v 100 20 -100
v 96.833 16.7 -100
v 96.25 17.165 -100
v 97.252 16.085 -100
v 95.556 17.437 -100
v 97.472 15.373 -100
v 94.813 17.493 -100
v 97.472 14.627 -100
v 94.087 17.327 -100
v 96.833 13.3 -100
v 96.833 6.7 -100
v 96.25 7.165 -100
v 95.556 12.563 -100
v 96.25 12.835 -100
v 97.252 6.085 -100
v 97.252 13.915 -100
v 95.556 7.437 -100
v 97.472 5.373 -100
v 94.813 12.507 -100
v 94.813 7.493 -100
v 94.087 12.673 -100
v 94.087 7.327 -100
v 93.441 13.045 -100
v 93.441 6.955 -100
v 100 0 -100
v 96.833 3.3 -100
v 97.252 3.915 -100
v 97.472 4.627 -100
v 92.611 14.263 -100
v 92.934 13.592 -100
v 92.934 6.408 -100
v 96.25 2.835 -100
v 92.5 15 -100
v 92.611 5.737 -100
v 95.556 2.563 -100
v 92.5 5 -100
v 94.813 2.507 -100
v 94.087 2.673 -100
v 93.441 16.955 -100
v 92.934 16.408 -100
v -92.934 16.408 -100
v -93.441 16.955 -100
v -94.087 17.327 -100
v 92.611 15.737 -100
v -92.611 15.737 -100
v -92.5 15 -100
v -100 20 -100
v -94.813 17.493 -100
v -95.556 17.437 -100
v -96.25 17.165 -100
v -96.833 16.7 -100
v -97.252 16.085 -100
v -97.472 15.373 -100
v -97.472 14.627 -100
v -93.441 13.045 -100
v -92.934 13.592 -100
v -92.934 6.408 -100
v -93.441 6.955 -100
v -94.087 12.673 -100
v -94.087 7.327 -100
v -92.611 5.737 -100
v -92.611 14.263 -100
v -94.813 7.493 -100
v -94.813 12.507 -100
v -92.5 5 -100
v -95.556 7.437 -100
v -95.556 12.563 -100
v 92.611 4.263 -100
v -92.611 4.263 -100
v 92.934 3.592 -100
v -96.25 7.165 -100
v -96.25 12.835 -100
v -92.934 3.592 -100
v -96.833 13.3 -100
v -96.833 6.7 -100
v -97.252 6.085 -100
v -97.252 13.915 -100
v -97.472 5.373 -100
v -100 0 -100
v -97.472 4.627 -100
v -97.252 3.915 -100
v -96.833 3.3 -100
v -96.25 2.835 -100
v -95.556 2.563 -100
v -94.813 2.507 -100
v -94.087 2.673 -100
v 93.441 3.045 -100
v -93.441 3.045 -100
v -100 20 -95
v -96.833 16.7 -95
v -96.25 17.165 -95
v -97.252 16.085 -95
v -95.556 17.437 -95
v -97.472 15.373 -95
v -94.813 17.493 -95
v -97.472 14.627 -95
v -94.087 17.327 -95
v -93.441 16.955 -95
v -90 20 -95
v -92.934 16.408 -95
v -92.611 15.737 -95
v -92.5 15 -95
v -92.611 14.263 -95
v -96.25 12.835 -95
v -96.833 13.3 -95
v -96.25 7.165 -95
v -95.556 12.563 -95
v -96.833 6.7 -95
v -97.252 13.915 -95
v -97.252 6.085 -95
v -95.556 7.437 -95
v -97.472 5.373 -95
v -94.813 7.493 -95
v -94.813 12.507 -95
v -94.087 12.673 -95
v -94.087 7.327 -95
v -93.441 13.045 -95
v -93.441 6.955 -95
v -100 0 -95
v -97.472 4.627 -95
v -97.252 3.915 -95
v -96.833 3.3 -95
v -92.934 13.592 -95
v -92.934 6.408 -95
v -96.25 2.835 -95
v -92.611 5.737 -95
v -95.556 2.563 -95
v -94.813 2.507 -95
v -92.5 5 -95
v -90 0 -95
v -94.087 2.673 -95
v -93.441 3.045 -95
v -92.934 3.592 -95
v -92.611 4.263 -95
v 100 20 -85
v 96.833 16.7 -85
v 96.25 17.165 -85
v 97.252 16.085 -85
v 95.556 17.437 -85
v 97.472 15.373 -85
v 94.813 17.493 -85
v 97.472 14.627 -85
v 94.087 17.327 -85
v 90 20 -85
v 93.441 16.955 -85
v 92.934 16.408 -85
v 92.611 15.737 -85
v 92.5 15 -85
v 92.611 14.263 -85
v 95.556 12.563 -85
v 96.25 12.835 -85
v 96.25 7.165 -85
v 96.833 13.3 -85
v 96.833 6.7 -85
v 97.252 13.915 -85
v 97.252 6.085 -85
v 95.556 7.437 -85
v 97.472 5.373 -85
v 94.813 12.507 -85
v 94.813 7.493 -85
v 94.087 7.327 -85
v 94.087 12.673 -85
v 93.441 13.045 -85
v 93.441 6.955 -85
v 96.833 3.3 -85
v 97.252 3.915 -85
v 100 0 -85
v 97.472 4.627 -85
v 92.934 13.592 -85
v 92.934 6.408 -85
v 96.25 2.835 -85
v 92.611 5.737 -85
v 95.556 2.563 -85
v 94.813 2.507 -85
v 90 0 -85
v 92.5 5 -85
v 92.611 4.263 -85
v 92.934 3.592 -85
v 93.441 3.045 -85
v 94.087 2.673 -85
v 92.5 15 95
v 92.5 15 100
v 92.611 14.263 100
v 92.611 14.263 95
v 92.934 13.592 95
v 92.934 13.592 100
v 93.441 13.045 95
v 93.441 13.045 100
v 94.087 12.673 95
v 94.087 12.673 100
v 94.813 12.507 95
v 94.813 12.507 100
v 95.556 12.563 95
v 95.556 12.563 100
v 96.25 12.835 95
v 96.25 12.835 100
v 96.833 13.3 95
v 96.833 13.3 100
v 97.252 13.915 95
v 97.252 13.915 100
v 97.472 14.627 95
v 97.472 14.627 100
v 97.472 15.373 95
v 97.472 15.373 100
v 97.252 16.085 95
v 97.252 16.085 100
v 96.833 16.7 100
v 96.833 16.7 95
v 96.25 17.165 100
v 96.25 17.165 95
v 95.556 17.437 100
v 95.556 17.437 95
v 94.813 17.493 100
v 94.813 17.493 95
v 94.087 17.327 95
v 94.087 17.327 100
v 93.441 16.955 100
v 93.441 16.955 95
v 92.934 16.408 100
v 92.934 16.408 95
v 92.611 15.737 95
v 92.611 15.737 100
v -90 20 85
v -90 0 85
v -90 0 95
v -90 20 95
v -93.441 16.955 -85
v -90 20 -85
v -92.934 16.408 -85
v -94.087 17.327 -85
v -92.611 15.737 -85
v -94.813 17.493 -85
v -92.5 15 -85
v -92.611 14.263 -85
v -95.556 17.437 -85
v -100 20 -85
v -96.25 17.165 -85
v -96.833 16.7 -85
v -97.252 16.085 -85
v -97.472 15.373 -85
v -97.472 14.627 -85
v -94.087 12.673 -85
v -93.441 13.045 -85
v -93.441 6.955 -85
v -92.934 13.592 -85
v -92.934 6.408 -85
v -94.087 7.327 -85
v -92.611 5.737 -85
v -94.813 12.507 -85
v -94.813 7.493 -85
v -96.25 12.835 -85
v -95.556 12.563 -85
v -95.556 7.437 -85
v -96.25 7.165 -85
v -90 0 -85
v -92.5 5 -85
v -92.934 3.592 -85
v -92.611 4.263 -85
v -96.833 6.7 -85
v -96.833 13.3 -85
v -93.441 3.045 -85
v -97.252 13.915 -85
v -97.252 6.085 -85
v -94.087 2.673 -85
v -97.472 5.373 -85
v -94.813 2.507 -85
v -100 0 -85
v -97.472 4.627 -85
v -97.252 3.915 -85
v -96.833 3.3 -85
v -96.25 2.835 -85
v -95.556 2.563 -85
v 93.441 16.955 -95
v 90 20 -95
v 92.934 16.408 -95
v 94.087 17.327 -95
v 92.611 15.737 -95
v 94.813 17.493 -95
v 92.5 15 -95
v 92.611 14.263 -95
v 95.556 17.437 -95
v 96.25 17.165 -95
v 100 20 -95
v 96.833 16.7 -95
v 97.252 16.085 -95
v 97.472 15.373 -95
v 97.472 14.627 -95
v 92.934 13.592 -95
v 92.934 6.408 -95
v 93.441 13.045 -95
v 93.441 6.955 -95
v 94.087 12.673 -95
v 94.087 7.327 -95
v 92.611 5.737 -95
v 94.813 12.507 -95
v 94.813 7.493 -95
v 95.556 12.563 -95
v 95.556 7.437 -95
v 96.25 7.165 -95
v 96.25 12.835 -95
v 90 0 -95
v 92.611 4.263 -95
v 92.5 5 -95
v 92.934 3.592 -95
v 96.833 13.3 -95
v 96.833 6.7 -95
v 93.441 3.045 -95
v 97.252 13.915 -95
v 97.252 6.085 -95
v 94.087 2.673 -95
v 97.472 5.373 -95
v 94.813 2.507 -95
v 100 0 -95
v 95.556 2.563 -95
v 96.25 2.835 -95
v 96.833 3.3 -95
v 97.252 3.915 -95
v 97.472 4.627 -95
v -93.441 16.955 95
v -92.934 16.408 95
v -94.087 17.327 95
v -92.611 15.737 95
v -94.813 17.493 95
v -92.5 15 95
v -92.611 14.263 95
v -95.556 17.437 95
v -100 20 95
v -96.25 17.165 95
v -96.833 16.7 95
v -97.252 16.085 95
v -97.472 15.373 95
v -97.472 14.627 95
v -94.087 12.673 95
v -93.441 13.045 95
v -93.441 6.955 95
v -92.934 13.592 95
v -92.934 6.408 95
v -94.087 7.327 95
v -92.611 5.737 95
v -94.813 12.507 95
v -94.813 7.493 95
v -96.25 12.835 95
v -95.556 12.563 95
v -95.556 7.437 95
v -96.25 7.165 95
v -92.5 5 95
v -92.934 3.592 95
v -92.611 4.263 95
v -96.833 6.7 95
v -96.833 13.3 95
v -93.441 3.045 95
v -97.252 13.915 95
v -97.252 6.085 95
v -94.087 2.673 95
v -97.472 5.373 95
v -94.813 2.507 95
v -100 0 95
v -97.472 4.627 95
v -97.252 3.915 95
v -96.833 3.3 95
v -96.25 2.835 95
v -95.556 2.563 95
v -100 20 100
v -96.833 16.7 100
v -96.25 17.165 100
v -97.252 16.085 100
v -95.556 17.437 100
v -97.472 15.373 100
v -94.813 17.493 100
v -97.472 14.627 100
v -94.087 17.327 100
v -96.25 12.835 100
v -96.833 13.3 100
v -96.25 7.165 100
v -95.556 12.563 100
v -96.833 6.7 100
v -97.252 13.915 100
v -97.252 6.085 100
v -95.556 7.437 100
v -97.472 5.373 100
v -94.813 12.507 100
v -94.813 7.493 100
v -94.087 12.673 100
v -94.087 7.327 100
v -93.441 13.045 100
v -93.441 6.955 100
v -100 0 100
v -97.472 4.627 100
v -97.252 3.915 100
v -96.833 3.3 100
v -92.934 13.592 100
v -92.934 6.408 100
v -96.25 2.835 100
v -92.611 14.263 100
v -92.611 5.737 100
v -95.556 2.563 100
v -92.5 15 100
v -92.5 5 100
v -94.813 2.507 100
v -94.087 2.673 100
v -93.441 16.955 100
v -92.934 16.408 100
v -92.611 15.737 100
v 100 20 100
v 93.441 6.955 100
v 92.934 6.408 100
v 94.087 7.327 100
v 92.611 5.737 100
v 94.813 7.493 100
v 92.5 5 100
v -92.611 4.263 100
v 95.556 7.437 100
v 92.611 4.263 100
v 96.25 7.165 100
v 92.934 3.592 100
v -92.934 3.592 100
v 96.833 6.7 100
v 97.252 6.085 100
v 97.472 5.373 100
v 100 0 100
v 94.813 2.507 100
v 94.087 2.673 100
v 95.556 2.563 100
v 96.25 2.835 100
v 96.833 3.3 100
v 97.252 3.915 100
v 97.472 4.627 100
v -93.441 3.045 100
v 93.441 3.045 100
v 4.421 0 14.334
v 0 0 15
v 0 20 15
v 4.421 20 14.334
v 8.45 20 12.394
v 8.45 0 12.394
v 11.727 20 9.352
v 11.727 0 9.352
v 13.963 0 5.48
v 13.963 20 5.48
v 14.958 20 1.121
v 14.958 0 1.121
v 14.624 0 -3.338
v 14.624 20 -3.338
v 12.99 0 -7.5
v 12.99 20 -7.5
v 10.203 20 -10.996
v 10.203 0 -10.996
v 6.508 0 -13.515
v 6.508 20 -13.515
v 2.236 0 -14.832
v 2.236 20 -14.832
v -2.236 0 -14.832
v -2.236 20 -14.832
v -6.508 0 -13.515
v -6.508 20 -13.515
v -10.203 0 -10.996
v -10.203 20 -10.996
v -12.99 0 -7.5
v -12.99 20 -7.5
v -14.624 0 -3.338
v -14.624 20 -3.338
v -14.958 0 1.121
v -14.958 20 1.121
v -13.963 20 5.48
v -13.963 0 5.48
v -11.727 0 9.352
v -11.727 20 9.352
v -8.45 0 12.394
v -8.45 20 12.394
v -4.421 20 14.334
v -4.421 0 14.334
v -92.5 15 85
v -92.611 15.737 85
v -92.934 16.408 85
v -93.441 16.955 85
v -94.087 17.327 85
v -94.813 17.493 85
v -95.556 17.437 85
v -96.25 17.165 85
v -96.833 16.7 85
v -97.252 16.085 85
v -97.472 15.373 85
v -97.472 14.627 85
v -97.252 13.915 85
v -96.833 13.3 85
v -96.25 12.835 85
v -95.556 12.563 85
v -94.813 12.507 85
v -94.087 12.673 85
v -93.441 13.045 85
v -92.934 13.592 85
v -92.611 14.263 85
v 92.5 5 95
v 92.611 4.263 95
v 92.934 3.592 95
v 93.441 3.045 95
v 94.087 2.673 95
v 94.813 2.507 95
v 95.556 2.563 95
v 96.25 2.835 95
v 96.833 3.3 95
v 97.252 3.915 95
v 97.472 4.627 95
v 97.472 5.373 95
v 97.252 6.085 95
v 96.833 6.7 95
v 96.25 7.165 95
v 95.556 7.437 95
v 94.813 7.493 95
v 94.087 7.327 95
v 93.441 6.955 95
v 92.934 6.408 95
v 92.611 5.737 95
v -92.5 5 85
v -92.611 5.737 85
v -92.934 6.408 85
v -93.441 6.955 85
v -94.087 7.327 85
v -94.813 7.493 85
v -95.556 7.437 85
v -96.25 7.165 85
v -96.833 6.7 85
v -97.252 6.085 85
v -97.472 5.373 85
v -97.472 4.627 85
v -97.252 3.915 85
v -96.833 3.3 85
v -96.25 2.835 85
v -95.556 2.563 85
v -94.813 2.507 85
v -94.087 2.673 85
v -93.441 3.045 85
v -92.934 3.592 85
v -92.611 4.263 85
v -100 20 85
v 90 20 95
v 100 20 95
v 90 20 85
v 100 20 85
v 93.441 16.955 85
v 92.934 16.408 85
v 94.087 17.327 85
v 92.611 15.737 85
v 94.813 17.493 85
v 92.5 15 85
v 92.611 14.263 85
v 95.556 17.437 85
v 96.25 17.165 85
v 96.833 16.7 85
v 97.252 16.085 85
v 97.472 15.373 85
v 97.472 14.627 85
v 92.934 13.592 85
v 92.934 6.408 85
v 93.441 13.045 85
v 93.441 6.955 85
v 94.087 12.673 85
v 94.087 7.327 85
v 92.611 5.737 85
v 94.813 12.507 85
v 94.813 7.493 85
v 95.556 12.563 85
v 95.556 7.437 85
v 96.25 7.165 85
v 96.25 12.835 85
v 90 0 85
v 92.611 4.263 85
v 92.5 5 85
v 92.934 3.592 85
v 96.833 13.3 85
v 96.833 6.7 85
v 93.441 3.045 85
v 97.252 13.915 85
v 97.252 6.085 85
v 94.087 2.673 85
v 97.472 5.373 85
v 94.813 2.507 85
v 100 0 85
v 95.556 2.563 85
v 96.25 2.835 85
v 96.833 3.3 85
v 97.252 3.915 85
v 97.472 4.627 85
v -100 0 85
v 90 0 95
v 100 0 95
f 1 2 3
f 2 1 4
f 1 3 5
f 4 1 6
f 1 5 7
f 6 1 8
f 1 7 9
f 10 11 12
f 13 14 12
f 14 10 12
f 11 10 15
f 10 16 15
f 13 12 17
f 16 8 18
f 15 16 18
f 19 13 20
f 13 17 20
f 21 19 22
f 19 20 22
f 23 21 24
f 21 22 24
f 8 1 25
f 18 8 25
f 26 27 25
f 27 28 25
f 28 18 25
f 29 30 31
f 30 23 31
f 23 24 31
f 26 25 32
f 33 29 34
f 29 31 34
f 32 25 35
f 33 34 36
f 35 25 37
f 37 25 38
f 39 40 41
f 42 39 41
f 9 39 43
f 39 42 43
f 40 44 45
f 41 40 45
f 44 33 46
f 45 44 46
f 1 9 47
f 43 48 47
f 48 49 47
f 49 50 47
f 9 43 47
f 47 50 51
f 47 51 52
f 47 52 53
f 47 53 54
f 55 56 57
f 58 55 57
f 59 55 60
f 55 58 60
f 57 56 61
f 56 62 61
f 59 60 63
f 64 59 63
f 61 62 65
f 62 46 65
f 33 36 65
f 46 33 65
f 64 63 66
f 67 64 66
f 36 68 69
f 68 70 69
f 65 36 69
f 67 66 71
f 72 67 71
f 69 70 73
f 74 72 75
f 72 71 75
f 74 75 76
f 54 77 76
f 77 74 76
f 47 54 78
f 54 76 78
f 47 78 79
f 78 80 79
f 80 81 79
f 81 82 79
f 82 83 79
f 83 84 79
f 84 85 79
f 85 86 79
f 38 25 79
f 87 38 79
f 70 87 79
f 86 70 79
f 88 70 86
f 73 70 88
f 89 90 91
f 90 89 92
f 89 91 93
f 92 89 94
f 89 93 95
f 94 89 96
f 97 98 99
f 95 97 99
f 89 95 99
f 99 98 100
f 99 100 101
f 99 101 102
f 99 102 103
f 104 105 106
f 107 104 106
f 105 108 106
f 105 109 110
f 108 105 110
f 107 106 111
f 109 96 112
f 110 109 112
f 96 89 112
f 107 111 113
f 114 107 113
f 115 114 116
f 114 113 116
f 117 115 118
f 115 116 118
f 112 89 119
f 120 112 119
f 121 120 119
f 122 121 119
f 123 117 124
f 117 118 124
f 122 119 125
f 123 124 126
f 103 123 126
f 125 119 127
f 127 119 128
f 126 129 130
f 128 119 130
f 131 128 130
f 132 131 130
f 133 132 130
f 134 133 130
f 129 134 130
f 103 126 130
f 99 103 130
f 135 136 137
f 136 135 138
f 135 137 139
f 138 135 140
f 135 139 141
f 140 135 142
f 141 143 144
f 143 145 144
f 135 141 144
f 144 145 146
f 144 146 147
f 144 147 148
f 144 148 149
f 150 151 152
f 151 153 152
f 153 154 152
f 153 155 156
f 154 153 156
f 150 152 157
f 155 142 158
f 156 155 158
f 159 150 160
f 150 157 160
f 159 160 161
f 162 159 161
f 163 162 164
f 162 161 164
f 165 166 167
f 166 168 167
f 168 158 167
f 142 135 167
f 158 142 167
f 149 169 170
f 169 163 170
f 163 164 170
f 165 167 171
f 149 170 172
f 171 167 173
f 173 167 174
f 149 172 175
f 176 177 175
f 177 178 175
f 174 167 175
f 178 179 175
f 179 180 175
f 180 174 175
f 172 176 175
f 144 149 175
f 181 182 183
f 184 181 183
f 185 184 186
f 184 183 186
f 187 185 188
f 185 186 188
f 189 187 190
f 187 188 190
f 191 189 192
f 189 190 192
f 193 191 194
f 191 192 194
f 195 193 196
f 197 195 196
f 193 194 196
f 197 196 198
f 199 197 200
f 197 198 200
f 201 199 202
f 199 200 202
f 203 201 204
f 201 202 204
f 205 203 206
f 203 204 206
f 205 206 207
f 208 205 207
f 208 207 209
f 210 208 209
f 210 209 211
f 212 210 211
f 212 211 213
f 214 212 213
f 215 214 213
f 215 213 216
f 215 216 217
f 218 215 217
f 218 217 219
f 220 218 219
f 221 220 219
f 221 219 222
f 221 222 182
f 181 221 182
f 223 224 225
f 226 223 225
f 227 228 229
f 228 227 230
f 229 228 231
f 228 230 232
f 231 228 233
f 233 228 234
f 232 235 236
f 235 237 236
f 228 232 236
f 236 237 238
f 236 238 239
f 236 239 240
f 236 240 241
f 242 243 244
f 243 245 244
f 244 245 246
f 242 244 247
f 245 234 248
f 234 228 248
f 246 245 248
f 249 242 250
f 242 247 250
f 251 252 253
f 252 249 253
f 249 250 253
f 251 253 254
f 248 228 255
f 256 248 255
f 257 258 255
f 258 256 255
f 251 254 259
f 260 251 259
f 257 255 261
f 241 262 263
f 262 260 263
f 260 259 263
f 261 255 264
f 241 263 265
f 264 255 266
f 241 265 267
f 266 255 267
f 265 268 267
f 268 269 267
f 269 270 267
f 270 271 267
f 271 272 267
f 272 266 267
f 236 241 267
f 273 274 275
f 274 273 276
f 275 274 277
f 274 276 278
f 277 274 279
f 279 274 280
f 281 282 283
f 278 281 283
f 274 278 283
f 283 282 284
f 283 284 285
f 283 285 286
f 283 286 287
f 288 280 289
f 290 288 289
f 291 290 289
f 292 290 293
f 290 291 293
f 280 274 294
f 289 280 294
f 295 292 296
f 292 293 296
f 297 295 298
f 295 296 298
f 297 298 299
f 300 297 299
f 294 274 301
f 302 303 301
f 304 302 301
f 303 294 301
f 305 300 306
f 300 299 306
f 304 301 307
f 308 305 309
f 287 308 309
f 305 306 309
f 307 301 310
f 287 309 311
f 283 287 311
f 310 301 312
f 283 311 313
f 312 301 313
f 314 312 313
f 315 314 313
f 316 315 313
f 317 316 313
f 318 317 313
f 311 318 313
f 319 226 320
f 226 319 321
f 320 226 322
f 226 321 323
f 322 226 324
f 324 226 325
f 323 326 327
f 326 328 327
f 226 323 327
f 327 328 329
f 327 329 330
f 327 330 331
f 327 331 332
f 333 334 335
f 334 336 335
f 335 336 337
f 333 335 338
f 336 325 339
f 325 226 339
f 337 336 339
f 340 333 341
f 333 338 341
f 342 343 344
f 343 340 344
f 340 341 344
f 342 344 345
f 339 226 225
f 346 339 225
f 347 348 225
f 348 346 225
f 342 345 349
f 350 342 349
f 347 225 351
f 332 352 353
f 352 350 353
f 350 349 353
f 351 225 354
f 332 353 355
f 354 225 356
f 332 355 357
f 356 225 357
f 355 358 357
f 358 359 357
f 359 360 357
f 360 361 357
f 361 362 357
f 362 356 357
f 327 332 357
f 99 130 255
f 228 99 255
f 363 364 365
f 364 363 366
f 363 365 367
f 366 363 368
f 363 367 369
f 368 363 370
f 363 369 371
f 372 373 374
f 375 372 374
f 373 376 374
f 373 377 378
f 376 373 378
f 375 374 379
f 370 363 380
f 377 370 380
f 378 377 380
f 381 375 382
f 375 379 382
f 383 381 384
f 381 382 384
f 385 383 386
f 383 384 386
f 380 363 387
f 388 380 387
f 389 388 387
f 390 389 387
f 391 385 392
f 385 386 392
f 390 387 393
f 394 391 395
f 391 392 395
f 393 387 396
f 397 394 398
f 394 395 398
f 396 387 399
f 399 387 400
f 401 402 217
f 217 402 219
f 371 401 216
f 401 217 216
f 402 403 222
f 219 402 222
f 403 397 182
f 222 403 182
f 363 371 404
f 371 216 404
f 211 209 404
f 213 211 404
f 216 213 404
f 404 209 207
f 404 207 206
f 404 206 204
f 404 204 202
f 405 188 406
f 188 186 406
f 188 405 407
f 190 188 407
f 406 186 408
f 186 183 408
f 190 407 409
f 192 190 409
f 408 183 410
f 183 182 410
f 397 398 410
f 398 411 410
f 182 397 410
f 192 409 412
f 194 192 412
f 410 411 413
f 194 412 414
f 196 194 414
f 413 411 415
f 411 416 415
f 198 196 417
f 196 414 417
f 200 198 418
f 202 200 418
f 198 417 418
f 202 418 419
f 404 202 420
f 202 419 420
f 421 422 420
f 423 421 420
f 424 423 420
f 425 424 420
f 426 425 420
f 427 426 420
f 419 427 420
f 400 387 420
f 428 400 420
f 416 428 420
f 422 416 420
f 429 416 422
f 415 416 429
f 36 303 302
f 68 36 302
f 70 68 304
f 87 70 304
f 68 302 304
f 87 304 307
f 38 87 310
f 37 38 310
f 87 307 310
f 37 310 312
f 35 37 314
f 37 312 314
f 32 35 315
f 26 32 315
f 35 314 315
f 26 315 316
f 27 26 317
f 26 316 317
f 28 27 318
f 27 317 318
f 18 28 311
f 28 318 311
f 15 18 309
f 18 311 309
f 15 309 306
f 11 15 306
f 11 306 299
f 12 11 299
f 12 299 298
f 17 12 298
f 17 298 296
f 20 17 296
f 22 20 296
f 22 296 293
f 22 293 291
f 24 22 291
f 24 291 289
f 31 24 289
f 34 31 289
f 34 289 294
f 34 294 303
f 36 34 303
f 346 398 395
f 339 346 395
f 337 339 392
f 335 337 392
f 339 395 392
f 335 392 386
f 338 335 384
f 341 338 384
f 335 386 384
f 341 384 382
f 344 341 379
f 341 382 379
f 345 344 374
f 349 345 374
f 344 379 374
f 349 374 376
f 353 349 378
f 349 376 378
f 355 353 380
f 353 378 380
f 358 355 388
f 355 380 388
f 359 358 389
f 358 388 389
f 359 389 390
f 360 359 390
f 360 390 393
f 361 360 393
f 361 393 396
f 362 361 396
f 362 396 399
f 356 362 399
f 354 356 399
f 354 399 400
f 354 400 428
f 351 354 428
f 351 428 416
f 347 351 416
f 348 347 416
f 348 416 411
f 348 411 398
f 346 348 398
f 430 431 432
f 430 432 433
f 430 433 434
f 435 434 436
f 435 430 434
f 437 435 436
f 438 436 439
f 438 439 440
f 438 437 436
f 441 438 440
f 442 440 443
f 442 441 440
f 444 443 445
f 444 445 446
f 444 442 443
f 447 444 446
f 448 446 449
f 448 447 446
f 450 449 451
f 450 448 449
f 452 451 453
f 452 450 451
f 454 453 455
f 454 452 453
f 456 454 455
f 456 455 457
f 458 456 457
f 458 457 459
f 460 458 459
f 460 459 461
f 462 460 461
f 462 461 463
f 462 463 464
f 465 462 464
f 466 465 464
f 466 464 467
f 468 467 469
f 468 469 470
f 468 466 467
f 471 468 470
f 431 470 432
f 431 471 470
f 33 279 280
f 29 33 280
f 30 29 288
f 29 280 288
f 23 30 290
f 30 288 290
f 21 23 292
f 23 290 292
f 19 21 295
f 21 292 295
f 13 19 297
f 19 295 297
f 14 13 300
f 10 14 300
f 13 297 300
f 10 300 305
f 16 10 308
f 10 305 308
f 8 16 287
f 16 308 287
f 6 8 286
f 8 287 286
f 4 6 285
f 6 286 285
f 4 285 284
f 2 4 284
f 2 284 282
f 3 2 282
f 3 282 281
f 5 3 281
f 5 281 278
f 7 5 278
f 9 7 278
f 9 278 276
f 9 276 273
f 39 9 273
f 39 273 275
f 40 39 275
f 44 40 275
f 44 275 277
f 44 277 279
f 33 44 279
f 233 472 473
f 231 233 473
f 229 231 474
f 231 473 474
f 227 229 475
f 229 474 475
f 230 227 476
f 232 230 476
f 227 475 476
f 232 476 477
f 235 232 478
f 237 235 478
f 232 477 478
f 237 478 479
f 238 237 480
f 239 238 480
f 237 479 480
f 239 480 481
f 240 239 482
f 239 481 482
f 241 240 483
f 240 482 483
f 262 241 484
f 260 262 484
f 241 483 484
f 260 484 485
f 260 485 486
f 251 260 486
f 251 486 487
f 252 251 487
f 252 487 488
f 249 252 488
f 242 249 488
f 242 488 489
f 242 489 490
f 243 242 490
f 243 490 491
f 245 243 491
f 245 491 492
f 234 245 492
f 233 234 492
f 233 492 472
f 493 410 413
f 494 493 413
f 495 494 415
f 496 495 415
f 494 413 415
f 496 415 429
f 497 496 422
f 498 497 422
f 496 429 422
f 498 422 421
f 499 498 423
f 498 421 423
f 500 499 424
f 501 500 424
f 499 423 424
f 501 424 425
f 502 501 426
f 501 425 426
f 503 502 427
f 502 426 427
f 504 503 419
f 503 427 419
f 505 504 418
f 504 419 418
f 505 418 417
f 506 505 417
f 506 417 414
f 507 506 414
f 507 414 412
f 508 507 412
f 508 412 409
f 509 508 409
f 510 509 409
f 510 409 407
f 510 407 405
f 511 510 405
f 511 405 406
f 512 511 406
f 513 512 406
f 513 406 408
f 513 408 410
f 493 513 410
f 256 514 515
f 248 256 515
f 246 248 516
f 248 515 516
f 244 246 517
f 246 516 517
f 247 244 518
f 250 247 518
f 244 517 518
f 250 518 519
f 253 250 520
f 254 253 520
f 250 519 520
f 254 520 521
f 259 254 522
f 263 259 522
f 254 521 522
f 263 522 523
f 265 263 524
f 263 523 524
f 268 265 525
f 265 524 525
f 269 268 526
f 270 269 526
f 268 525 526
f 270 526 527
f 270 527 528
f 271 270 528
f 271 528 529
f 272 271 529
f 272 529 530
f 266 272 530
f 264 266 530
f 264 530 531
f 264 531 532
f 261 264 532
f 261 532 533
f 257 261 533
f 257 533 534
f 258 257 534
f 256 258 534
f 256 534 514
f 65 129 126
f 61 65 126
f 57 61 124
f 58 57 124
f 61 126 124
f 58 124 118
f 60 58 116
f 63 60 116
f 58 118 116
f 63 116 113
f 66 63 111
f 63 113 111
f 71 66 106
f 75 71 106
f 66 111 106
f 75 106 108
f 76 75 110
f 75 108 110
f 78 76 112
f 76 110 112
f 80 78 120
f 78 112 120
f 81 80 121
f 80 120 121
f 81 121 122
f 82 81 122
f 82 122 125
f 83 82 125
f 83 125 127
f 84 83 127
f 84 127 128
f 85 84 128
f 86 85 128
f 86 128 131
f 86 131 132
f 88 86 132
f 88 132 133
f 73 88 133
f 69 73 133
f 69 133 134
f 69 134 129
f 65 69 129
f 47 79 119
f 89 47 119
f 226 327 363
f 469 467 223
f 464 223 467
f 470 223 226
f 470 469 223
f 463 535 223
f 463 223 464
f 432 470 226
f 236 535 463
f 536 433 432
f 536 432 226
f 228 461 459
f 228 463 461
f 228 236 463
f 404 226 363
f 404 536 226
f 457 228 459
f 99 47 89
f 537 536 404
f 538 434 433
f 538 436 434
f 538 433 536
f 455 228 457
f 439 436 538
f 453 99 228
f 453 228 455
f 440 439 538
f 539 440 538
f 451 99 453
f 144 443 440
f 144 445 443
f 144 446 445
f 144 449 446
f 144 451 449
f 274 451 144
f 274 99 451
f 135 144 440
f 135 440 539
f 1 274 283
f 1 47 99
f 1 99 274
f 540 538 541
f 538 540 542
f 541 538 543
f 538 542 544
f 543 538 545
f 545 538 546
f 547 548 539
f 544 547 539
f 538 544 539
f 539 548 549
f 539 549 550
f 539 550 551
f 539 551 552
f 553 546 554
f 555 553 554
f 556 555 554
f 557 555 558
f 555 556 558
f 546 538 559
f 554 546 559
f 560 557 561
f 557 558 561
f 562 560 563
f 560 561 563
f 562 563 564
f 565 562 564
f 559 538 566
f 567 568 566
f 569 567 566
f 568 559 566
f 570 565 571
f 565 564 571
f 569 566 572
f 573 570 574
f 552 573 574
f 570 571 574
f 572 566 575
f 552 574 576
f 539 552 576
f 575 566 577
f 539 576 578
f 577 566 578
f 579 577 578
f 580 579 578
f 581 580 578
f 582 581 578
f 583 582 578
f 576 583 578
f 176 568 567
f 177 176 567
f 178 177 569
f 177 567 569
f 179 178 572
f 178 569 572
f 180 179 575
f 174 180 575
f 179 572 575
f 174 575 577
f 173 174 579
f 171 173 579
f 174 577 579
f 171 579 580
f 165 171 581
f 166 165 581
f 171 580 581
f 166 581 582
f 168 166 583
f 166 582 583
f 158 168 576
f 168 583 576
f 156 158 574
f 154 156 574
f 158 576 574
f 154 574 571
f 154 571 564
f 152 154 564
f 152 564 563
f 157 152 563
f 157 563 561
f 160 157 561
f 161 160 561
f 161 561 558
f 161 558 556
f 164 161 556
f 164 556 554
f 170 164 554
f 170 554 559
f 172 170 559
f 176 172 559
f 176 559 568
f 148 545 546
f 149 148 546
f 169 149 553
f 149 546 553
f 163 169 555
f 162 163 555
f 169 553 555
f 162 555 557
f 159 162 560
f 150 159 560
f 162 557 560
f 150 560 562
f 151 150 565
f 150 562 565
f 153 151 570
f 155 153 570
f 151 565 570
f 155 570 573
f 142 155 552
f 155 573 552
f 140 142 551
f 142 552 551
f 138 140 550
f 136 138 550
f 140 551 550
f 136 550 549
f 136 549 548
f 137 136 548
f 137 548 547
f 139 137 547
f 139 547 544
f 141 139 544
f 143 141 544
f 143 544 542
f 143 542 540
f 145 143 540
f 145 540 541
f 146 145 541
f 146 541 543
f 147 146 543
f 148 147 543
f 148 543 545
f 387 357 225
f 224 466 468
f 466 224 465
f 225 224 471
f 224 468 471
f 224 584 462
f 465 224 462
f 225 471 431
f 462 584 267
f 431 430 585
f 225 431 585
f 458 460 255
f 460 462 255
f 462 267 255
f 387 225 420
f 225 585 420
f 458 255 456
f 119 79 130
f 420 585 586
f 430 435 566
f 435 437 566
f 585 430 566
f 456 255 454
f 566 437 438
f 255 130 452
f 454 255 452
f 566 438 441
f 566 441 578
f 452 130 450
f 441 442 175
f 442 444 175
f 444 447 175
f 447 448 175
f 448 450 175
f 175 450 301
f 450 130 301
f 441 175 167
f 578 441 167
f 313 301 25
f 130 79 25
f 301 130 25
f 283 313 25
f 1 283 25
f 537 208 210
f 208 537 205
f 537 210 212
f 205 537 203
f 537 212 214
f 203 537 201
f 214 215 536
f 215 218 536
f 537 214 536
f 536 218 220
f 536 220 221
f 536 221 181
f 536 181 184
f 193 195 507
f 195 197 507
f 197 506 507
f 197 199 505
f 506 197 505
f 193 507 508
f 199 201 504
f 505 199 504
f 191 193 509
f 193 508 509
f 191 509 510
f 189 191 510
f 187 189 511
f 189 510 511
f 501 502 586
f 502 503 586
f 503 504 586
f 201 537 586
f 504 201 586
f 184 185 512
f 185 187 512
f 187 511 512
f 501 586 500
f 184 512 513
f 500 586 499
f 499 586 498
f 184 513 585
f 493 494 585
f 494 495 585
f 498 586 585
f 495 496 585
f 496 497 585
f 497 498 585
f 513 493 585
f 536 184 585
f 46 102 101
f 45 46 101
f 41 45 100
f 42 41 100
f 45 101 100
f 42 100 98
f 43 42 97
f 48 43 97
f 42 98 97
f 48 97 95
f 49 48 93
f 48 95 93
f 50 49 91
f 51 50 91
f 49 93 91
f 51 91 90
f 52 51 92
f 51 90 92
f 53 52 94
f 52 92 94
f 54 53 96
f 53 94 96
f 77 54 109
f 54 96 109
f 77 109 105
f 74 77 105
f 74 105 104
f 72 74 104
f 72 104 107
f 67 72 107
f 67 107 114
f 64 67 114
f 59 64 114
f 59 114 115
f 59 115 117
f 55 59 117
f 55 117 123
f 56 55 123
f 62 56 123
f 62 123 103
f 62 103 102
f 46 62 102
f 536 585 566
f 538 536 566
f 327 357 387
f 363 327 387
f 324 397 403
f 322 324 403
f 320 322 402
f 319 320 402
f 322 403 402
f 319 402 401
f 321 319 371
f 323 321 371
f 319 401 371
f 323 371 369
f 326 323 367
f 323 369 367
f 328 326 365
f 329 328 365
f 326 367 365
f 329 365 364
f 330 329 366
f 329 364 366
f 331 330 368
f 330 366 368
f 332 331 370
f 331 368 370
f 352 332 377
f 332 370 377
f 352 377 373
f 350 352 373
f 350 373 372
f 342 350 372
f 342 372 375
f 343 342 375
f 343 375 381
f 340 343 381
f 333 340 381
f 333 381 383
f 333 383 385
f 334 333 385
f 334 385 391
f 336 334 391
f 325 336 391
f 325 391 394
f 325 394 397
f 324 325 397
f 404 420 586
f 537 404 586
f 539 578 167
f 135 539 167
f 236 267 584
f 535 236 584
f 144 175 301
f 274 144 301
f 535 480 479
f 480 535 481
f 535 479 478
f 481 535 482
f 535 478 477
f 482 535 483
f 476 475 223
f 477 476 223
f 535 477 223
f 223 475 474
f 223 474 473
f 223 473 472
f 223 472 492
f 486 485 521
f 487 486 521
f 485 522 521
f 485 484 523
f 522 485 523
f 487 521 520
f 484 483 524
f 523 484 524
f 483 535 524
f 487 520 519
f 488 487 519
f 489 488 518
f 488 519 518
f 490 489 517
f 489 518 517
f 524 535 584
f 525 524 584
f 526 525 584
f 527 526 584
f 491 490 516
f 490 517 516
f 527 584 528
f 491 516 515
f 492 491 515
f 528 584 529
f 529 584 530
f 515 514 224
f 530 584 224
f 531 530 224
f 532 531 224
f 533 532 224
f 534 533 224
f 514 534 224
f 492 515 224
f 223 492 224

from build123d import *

# Parameters (mm, degrees)
ESQUISSE1_R             = 15
BASE_DEPTH              = 20
ESQUISSE2_R             = 2.5
ENL_V_MAT_EXTRU_1_DEPTH = 225.499443206


with BuildPart() as part:
    # Esquisse1 → BASE (new body)
    with BuildSketch(Plane(origin=(0, 0, 0), x_dir=(1, 0, 0), z_dir=(0, 1, 0))):
        Polygon((-100, 95), (-90, 95), (-90, 85), (-100, 85), (-100, -85), (-90, -85), (-90, -95), (-100, -95), (-100, -100), (100, -100), (100, -95), (90, -95), (90, -85), (100, -85), (100, 85), (90, 85), (90, 95), (100, 95), (100, 100), (-100, 100), align=None)
        with Locations(Location((0, 0, 0), (0, 0, 270))):
            Circle(ESQUISSE1_R, mode=Mode.SUBTRACT)
    extrude(amount=BASE_DEPTH)

    # Esquisse2 → Enlèv. mat.-Extru.1 (cut, through all)
    with BuildSketch(Plane.XY.offset(100)):
        with Locations((-95, 15)):
            Circle(ESQUISSE2_R)
        with Locations((-95, 5)):
            Circle(ESQUISSE2_R)
        with Locations(Location((95, 5, 0), (0, 0, 180))):
            Circle(ESQUISSE2_R)
        with Locations(Location((95, 15, 0), (0, 0, 180))):
            Circle(ESQUISSE2_R)
    extrude(amount=-ENL_V_MAT_EXTRU_1_DEPTH, mode=Mode.SUBTRACT)


solid = part.part
